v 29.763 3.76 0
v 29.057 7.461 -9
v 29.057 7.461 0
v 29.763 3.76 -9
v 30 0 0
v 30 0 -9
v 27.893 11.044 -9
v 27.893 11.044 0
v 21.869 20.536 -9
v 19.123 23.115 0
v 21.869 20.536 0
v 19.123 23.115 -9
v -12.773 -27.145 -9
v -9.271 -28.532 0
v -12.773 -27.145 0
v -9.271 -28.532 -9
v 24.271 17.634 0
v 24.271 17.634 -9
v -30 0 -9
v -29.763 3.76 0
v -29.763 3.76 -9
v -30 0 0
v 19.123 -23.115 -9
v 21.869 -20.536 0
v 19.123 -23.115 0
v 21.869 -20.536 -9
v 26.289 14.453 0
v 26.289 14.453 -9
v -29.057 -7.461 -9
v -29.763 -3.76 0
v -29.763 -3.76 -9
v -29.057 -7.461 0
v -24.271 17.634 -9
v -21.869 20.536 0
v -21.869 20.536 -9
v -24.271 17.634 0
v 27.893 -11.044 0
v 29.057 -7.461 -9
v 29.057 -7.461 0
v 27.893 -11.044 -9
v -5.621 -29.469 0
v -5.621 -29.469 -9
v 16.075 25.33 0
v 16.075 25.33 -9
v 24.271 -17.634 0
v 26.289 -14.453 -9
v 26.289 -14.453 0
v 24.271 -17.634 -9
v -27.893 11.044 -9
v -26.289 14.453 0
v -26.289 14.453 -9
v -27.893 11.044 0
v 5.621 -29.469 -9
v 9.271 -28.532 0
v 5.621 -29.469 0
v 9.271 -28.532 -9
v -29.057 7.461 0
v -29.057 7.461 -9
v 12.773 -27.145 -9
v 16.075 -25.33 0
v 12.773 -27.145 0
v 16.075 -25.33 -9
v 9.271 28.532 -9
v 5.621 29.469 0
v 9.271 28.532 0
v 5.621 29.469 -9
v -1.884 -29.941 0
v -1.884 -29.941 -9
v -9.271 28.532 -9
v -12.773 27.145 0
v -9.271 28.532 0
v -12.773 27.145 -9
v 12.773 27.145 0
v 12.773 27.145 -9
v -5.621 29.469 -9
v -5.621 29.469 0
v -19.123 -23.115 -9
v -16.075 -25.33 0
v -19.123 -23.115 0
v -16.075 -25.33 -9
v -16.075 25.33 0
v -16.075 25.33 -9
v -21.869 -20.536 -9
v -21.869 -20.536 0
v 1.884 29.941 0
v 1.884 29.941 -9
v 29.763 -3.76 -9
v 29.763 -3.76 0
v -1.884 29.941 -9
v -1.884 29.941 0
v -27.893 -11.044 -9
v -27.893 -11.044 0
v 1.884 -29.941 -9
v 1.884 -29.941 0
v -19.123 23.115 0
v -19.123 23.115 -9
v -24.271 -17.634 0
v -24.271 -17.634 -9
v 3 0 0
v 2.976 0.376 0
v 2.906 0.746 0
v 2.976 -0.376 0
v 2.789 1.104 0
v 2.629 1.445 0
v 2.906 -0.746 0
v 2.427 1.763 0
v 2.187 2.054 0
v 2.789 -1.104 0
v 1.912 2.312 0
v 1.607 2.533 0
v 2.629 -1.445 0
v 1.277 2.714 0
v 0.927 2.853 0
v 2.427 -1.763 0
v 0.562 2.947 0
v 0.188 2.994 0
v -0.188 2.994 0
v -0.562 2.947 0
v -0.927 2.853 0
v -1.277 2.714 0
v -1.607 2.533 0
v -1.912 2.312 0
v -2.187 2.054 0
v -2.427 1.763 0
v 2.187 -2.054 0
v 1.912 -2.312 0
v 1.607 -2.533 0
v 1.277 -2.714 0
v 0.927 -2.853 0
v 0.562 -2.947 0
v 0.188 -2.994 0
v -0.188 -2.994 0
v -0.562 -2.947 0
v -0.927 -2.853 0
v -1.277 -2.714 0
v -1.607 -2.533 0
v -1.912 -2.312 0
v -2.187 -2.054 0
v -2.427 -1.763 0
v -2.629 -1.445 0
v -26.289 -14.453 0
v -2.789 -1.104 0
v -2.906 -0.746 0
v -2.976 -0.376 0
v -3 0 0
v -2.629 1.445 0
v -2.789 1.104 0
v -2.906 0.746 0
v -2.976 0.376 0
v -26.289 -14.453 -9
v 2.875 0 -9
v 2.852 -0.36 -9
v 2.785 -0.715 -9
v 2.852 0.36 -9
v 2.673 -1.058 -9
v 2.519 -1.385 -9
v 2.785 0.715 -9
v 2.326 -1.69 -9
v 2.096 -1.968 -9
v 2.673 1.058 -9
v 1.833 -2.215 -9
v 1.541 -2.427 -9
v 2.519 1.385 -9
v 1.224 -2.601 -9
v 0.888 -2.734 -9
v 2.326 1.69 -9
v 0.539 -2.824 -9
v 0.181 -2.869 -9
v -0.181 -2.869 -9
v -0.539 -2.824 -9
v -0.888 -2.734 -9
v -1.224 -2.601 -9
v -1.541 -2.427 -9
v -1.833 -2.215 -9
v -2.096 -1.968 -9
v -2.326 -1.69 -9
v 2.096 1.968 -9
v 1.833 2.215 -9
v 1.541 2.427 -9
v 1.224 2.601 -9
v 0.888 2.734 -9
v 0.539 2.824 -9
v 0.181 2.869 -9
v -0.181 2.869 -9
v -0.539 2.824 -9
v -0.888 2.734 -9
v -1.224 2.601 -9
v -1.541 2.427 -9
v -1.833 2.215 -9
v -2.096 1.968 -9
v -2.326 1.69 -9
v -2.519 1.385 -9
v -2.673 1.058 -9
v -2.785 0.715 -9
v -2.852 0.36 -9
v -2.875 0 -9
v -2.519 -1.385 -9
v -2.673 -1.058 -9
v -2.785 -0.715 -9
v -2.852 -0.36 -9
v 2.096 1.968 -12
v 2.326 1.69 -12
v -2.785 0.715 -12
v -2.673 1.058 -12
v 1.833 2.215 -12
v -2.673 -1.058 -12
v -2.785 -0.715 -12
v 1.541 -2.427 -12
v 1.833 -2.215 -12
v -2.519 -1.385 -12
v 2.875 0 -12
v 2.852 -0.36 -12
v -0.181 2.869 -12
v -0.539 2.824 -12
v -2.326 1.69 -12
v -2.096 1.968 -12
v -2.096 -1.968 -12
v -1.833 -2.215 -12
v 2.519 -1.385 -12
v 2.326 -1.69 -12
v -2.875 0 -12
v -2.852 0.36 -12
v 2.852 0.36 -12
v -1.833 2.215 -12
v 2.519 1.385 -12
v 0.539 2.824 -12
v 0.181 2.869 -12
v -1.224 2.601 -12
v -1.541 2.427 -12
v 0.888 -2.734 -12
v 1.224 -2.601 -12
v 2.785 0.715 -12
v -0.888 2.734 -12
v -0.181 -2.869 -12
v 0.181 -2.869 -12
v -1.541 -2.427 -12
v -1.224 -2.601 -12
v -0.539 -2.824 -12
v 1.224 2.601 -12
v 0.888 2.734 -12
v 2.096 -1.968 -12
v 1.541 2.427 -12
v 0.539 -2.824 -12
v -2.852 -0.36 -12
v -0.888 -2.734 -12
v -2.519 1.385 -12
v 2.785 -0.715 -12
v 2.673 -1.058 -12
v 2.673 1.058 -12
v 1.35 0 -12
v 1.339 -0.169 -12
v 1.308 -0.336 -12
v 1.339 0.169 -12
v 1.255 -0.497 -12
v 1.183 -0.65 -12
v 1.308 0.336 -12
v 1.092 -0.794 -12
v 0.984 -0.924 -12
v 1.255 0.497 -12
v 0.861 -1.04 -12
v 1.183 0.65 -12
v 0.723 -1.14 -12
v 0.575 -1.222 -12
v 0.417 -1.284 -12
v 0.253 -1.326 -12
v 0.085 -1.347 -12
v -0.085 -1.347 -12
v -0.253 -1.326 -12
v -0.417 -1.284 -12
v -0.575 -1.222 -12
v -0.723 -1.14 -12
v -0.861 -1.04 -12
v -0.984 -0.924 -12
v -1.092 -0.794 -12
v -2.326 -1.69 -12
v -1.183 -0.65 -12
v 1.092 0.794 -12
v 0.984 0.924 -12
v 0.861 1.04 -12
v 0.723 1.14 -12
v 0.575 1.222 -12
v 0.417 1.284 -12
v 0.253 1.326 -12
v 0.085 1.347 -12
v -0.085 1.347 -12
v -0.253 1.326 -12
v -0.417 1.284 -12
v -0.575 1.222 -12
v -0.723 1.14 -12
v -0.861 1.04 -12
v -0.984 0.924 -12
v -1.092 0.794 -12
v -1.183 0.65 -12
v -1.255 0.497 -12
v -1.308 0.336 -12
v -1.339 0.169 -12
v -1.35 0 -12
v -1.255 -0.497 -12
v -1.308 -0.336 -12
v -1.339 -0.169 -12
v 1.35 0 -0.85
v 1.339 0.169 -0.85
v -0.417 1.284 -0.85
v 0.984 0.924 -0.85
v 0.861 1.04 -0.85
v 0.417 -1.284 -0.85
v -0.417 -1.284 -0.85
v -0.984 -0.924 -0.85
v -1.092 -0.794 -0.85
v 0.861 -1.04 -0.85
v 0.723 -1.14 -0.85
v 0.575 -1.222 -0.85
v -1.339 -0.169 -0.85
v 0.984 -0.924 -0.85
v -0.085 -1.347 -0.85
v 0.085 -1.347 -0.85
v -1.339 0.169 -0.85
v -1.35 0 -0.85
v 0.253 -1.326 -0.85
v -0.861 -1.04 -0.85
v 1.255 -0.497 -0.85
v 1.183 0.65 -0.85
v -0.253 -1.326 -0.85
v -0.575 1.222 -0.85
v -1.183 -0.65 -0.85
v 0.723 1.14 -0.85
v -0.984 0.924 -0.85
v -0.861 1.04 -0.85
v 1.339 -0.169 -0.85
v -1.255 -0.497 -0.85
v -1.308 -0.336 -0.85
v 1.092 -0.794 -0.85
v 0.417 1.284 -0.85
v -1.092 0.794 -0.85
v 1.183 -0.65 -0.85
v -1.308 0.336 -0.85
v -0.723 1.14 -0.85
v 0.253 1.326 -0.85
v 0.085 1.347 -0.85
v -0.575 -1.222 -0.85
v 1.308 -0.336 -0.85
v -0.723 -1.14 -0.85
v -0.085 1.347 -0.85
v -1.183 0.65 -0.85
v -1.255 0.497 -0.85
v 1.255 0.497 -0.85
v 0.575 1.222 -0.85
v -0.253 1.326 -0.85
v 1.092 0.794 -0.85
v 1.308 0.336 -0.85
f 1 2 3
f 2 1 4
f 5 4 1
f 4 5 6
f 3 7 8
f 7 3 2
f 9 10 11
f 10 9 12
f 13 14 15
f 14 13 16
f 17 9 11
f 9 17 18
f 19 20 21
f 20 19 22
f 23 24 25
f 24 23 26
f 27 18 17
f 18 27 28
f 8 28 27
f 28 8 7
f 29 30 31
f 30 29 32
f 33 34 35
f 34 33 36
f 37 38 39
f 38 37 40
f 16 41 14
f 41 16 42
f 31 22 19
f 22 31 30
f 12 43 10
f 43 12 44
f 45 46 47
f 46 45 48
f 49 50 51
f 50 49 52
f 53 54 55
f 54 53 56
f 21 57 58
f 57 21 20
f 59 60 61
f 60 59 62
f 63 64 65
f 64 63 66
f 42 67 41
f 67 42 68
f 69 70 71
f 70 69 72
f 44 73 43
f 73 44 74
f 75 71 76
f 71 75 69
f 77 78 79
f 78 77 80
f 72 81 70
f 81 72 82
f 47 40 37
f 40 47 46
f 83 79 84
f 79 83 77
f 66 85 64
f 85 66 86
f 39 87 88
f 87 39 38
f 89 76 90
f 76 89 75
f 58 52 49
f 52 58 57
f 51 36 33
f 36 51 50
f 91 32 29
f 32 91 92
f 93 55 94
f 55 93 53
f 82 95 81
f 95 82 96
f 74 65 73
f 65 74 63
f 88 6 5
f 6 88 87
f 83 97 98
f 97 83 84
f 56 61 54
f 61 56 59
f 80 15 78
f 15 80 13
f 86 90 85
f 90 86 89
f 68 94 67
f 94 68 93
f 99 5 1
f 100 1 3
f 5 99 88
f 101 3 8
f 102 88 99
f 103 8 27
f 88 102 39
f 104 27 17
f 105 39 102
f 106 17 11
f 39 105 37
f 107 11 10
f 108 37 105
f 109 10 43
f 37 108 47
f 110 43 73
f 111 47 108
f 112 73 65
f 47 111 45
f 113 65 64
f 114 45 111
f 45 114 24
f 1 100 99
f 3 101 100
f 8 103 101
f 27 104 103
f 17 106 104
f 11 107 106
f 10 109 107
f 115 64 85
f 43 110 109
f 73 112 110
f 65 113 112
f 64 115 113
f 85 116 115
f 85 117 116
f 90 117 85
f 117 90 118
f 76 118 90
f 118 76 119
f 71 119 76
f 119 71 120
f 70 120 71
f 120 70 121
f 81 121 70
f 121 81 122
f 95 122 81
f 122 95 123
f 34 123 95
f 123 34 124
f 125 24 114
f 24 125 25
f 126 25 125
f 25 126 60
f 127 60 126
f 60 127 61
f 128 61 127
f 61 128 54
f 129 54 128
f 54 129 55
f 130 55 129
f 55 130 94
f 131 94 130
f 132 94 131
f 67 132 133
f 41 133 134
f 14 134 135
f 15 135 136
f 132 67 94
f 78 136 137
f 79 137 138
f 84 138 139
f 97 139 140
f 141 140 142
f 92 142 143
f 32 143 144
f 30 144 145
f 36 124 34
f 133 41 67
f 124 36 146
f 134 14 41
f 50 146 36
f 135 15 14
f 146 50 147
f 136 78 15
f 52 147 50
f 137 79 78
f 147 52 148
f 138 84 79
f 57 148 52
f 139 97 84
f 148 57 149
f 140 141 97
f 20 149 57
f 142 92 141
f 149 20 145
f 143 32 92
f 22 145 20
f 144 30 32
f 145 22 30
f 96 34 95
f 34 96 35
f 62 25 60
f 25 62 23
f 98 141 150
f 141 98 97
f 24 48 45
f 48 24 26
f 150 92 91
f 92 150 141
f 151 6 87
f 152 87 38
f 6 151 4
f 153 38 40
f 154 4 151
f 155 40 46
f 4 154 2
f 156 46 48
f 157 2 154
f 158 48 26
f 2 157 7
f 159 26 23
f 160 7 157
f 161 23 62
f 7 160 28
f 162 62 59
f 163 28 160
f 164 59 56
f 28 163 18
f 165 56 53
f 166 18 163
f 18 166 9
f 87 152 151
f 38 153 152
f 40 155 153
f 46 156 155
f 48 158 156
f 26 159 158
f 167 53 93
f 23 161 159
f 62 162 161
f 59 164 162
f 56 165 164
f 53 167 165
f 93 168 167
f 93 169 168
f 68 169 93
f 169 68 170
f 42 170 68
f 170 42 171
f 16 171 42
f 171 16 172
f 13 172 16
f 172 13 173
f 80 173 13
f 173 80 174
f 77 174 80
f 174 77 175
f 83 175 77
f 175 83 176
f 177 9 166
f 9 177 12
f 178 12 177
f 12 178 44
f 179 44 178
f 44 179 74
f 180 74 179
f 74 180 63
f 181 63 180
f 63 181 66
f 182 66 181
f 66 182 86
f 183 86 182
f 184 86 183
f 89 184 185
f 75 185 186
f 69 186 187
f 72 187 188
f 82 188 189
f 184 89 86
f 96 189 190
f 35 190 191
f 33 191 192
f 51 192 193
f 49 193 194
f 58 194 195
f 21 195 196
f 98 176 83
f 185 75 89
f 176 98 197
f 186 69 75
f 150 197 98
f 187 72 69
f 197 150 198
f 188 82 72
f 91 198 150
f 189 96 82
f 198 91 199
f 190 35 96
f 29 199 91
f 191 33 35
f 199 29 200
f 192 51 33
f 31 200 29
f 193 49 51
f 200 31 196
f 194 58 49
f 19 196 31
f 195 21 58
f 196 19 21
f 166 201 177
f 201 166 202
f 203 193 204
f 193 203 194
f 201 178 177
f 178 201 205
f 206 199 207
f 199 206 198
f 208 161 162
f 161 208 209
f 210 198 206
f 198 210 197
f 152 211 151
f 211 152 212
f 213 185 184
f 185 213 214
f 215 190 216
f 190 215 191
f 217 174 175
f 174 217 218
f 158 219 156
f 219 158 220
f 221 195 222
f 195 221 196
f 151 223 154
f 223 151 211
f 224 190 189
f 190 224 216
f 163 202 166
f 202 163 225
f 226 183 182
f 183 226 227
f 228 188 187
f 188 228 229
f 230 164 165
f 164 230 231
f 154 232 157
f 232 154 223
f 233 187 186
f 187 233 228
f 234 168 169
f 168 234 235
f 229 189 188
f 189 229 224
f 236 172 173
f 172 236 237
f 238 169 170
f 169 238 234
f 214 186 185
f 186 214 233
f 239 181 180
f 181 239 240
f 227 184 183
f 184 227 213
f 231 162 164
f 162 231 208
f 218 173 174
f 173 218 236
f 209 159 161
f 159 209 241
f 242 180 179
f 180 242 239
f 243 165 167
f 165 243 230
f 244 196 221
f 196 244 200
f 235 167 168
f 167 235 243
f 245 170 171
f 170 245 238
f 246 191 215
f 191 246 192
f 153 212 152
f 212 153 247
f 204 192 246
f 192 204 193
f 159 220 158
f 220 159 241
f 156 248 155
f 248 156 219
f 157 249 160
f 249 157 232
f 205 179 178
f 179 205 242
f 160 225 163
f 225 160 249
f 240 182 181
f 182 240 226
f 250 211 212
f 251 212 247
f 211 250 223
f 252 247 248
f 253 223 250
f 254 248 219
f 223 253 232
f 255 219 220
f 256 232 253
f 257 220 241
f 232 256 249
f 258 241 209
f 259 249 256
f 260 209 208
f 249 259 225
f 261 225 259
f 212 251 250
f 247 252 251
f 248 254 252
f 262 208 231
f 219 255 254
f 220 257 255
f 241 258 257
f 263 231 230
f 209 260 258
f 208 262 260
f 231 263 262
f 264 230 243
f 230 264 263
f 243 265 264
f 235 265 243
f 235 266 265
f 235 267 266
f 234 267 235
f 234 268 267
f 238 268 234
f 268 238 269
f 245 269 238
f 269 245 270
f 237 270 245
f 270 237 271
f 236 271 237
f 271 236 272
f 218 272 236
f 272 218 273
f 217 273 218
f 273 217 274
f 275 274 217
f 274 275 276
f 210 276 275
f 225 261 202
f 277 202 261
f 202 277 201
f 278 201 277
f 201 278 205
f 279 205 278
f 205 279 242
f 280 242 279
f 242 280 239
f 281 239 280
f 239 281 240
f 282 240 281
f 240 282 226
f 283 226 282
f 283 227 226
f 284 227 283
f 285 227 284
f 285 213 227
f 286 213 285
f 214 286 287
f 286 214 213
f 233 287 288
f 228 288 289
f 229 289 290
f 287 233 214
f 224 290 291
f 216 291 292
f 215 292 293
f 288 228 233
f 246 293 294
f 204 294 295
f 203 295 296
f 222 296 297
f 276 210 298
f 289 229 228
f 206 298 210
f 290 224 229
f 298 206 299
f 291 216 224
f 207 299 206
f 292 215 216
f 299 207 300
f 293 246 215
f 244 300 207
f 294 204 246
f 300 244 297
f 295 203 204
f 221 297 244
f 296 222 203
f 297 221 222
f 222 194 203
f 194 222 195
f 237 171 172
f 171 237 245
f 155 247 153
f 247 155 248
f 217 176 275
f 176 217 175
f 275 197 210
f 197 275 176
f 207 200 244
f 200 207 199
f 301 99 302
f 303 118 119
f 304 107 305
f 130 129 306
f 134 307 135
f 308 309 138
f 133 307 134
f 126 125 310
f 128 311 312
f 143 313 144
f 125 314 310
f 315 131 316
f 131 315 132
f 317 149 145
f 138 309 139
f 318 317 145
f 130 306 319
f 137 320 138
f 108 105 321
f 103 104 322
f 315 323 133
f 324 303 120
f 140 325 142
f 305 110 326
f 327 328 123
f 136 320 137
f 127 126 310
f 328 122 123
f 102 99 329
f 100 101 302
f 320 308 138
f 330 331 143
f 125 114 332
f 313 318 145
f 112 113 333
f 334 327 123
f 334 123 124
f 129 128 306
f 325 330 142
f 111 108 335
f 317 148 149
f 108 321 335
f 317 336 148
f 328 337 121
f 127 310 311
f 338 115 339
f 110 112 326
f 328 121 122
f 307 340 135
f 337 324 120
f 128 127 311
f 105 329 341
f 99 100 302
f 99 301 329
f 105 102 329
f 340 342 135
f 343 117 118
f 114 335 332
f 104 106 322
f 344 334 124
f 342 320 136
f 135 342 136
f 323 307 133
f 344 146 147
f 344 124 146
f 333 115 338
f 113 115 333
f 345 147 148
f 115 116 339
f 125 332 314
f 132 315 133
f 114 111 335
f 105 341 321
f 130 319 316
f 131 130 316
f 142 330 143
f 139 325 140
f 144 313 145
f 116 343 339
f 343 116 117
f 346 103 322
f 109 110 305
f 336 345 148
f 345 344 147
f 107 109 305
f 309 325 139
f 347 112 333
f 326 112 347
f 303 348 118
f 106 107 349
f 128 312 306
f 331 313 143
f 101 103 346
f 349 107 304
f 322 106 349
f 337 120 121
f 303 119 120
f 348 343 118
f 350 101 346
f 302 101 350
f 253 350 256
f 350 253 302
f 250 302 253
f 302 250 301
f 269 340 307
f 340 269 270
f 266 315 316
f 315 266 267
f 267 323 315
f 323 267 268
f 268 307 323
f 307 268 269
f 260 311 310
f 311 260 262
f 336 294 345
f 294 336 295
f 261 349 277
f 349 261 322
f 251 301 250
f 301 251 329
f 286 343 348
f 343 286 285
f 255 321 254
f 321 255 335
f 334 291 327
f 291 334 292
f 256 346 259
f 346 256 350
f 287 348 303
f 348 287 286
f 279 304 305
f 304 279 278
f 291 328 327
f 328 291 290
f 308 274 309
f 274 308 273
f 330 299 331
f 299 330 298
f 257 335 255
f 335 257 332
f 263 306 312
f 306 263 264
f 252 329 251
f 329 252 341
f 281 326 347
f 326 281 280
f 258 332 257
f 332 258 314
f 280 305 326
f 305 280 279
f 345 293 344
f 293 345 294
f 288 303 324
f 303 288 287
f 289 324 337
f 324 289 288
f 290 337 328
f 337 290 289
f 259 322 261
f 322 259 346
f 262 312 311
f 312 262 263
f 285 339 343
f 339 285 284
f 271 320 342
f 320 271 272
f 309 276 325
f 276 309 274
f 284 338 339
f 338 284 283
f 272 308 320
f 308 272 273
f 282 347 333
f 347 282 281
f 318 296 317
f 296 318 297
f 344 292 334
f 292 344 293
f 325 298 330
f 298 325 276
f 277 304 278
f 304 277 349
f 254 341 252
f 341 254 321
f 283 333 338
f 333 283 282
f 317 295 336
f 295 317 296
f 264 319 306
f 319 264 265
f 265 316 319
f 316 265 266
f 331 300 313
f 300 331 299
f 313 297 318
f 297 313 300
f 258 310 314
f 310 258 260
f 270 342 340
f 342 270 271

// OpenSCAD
$fn = 50;

difference() {
	union() {
		translate(v = [0, 0, -9.0]) {
			cylinder(h = 9, r = 30.0);
		}
		#translate(v = [0, 0, -12.0]) {
			cylinder(h = 12, r = 2.875);
		}
	}
	union() {
		translate(v = [0, 0, 0]) {
			rotate(a = [0, 0, 0]) {
				difference() {
					union() {
						translate(v = [0, 0, -12.0]) {
							cylinder(h = 12, r = 1.0);
						}
						translate(v = [0, 0, -0.85]) {
							cylinder(h = 0.85, r1 = 1.35, r2 = 3.0);
						}
						translate(v = [0, 0, -12.0]) {
							cylinder(h = 12, r = 1.35);
						}
						translate(v = [0, 0, -12.0]) {
							cylinder(h = 12, r = 1.0);
						}
					}
					union();
				}
			}
		}
	}
}
